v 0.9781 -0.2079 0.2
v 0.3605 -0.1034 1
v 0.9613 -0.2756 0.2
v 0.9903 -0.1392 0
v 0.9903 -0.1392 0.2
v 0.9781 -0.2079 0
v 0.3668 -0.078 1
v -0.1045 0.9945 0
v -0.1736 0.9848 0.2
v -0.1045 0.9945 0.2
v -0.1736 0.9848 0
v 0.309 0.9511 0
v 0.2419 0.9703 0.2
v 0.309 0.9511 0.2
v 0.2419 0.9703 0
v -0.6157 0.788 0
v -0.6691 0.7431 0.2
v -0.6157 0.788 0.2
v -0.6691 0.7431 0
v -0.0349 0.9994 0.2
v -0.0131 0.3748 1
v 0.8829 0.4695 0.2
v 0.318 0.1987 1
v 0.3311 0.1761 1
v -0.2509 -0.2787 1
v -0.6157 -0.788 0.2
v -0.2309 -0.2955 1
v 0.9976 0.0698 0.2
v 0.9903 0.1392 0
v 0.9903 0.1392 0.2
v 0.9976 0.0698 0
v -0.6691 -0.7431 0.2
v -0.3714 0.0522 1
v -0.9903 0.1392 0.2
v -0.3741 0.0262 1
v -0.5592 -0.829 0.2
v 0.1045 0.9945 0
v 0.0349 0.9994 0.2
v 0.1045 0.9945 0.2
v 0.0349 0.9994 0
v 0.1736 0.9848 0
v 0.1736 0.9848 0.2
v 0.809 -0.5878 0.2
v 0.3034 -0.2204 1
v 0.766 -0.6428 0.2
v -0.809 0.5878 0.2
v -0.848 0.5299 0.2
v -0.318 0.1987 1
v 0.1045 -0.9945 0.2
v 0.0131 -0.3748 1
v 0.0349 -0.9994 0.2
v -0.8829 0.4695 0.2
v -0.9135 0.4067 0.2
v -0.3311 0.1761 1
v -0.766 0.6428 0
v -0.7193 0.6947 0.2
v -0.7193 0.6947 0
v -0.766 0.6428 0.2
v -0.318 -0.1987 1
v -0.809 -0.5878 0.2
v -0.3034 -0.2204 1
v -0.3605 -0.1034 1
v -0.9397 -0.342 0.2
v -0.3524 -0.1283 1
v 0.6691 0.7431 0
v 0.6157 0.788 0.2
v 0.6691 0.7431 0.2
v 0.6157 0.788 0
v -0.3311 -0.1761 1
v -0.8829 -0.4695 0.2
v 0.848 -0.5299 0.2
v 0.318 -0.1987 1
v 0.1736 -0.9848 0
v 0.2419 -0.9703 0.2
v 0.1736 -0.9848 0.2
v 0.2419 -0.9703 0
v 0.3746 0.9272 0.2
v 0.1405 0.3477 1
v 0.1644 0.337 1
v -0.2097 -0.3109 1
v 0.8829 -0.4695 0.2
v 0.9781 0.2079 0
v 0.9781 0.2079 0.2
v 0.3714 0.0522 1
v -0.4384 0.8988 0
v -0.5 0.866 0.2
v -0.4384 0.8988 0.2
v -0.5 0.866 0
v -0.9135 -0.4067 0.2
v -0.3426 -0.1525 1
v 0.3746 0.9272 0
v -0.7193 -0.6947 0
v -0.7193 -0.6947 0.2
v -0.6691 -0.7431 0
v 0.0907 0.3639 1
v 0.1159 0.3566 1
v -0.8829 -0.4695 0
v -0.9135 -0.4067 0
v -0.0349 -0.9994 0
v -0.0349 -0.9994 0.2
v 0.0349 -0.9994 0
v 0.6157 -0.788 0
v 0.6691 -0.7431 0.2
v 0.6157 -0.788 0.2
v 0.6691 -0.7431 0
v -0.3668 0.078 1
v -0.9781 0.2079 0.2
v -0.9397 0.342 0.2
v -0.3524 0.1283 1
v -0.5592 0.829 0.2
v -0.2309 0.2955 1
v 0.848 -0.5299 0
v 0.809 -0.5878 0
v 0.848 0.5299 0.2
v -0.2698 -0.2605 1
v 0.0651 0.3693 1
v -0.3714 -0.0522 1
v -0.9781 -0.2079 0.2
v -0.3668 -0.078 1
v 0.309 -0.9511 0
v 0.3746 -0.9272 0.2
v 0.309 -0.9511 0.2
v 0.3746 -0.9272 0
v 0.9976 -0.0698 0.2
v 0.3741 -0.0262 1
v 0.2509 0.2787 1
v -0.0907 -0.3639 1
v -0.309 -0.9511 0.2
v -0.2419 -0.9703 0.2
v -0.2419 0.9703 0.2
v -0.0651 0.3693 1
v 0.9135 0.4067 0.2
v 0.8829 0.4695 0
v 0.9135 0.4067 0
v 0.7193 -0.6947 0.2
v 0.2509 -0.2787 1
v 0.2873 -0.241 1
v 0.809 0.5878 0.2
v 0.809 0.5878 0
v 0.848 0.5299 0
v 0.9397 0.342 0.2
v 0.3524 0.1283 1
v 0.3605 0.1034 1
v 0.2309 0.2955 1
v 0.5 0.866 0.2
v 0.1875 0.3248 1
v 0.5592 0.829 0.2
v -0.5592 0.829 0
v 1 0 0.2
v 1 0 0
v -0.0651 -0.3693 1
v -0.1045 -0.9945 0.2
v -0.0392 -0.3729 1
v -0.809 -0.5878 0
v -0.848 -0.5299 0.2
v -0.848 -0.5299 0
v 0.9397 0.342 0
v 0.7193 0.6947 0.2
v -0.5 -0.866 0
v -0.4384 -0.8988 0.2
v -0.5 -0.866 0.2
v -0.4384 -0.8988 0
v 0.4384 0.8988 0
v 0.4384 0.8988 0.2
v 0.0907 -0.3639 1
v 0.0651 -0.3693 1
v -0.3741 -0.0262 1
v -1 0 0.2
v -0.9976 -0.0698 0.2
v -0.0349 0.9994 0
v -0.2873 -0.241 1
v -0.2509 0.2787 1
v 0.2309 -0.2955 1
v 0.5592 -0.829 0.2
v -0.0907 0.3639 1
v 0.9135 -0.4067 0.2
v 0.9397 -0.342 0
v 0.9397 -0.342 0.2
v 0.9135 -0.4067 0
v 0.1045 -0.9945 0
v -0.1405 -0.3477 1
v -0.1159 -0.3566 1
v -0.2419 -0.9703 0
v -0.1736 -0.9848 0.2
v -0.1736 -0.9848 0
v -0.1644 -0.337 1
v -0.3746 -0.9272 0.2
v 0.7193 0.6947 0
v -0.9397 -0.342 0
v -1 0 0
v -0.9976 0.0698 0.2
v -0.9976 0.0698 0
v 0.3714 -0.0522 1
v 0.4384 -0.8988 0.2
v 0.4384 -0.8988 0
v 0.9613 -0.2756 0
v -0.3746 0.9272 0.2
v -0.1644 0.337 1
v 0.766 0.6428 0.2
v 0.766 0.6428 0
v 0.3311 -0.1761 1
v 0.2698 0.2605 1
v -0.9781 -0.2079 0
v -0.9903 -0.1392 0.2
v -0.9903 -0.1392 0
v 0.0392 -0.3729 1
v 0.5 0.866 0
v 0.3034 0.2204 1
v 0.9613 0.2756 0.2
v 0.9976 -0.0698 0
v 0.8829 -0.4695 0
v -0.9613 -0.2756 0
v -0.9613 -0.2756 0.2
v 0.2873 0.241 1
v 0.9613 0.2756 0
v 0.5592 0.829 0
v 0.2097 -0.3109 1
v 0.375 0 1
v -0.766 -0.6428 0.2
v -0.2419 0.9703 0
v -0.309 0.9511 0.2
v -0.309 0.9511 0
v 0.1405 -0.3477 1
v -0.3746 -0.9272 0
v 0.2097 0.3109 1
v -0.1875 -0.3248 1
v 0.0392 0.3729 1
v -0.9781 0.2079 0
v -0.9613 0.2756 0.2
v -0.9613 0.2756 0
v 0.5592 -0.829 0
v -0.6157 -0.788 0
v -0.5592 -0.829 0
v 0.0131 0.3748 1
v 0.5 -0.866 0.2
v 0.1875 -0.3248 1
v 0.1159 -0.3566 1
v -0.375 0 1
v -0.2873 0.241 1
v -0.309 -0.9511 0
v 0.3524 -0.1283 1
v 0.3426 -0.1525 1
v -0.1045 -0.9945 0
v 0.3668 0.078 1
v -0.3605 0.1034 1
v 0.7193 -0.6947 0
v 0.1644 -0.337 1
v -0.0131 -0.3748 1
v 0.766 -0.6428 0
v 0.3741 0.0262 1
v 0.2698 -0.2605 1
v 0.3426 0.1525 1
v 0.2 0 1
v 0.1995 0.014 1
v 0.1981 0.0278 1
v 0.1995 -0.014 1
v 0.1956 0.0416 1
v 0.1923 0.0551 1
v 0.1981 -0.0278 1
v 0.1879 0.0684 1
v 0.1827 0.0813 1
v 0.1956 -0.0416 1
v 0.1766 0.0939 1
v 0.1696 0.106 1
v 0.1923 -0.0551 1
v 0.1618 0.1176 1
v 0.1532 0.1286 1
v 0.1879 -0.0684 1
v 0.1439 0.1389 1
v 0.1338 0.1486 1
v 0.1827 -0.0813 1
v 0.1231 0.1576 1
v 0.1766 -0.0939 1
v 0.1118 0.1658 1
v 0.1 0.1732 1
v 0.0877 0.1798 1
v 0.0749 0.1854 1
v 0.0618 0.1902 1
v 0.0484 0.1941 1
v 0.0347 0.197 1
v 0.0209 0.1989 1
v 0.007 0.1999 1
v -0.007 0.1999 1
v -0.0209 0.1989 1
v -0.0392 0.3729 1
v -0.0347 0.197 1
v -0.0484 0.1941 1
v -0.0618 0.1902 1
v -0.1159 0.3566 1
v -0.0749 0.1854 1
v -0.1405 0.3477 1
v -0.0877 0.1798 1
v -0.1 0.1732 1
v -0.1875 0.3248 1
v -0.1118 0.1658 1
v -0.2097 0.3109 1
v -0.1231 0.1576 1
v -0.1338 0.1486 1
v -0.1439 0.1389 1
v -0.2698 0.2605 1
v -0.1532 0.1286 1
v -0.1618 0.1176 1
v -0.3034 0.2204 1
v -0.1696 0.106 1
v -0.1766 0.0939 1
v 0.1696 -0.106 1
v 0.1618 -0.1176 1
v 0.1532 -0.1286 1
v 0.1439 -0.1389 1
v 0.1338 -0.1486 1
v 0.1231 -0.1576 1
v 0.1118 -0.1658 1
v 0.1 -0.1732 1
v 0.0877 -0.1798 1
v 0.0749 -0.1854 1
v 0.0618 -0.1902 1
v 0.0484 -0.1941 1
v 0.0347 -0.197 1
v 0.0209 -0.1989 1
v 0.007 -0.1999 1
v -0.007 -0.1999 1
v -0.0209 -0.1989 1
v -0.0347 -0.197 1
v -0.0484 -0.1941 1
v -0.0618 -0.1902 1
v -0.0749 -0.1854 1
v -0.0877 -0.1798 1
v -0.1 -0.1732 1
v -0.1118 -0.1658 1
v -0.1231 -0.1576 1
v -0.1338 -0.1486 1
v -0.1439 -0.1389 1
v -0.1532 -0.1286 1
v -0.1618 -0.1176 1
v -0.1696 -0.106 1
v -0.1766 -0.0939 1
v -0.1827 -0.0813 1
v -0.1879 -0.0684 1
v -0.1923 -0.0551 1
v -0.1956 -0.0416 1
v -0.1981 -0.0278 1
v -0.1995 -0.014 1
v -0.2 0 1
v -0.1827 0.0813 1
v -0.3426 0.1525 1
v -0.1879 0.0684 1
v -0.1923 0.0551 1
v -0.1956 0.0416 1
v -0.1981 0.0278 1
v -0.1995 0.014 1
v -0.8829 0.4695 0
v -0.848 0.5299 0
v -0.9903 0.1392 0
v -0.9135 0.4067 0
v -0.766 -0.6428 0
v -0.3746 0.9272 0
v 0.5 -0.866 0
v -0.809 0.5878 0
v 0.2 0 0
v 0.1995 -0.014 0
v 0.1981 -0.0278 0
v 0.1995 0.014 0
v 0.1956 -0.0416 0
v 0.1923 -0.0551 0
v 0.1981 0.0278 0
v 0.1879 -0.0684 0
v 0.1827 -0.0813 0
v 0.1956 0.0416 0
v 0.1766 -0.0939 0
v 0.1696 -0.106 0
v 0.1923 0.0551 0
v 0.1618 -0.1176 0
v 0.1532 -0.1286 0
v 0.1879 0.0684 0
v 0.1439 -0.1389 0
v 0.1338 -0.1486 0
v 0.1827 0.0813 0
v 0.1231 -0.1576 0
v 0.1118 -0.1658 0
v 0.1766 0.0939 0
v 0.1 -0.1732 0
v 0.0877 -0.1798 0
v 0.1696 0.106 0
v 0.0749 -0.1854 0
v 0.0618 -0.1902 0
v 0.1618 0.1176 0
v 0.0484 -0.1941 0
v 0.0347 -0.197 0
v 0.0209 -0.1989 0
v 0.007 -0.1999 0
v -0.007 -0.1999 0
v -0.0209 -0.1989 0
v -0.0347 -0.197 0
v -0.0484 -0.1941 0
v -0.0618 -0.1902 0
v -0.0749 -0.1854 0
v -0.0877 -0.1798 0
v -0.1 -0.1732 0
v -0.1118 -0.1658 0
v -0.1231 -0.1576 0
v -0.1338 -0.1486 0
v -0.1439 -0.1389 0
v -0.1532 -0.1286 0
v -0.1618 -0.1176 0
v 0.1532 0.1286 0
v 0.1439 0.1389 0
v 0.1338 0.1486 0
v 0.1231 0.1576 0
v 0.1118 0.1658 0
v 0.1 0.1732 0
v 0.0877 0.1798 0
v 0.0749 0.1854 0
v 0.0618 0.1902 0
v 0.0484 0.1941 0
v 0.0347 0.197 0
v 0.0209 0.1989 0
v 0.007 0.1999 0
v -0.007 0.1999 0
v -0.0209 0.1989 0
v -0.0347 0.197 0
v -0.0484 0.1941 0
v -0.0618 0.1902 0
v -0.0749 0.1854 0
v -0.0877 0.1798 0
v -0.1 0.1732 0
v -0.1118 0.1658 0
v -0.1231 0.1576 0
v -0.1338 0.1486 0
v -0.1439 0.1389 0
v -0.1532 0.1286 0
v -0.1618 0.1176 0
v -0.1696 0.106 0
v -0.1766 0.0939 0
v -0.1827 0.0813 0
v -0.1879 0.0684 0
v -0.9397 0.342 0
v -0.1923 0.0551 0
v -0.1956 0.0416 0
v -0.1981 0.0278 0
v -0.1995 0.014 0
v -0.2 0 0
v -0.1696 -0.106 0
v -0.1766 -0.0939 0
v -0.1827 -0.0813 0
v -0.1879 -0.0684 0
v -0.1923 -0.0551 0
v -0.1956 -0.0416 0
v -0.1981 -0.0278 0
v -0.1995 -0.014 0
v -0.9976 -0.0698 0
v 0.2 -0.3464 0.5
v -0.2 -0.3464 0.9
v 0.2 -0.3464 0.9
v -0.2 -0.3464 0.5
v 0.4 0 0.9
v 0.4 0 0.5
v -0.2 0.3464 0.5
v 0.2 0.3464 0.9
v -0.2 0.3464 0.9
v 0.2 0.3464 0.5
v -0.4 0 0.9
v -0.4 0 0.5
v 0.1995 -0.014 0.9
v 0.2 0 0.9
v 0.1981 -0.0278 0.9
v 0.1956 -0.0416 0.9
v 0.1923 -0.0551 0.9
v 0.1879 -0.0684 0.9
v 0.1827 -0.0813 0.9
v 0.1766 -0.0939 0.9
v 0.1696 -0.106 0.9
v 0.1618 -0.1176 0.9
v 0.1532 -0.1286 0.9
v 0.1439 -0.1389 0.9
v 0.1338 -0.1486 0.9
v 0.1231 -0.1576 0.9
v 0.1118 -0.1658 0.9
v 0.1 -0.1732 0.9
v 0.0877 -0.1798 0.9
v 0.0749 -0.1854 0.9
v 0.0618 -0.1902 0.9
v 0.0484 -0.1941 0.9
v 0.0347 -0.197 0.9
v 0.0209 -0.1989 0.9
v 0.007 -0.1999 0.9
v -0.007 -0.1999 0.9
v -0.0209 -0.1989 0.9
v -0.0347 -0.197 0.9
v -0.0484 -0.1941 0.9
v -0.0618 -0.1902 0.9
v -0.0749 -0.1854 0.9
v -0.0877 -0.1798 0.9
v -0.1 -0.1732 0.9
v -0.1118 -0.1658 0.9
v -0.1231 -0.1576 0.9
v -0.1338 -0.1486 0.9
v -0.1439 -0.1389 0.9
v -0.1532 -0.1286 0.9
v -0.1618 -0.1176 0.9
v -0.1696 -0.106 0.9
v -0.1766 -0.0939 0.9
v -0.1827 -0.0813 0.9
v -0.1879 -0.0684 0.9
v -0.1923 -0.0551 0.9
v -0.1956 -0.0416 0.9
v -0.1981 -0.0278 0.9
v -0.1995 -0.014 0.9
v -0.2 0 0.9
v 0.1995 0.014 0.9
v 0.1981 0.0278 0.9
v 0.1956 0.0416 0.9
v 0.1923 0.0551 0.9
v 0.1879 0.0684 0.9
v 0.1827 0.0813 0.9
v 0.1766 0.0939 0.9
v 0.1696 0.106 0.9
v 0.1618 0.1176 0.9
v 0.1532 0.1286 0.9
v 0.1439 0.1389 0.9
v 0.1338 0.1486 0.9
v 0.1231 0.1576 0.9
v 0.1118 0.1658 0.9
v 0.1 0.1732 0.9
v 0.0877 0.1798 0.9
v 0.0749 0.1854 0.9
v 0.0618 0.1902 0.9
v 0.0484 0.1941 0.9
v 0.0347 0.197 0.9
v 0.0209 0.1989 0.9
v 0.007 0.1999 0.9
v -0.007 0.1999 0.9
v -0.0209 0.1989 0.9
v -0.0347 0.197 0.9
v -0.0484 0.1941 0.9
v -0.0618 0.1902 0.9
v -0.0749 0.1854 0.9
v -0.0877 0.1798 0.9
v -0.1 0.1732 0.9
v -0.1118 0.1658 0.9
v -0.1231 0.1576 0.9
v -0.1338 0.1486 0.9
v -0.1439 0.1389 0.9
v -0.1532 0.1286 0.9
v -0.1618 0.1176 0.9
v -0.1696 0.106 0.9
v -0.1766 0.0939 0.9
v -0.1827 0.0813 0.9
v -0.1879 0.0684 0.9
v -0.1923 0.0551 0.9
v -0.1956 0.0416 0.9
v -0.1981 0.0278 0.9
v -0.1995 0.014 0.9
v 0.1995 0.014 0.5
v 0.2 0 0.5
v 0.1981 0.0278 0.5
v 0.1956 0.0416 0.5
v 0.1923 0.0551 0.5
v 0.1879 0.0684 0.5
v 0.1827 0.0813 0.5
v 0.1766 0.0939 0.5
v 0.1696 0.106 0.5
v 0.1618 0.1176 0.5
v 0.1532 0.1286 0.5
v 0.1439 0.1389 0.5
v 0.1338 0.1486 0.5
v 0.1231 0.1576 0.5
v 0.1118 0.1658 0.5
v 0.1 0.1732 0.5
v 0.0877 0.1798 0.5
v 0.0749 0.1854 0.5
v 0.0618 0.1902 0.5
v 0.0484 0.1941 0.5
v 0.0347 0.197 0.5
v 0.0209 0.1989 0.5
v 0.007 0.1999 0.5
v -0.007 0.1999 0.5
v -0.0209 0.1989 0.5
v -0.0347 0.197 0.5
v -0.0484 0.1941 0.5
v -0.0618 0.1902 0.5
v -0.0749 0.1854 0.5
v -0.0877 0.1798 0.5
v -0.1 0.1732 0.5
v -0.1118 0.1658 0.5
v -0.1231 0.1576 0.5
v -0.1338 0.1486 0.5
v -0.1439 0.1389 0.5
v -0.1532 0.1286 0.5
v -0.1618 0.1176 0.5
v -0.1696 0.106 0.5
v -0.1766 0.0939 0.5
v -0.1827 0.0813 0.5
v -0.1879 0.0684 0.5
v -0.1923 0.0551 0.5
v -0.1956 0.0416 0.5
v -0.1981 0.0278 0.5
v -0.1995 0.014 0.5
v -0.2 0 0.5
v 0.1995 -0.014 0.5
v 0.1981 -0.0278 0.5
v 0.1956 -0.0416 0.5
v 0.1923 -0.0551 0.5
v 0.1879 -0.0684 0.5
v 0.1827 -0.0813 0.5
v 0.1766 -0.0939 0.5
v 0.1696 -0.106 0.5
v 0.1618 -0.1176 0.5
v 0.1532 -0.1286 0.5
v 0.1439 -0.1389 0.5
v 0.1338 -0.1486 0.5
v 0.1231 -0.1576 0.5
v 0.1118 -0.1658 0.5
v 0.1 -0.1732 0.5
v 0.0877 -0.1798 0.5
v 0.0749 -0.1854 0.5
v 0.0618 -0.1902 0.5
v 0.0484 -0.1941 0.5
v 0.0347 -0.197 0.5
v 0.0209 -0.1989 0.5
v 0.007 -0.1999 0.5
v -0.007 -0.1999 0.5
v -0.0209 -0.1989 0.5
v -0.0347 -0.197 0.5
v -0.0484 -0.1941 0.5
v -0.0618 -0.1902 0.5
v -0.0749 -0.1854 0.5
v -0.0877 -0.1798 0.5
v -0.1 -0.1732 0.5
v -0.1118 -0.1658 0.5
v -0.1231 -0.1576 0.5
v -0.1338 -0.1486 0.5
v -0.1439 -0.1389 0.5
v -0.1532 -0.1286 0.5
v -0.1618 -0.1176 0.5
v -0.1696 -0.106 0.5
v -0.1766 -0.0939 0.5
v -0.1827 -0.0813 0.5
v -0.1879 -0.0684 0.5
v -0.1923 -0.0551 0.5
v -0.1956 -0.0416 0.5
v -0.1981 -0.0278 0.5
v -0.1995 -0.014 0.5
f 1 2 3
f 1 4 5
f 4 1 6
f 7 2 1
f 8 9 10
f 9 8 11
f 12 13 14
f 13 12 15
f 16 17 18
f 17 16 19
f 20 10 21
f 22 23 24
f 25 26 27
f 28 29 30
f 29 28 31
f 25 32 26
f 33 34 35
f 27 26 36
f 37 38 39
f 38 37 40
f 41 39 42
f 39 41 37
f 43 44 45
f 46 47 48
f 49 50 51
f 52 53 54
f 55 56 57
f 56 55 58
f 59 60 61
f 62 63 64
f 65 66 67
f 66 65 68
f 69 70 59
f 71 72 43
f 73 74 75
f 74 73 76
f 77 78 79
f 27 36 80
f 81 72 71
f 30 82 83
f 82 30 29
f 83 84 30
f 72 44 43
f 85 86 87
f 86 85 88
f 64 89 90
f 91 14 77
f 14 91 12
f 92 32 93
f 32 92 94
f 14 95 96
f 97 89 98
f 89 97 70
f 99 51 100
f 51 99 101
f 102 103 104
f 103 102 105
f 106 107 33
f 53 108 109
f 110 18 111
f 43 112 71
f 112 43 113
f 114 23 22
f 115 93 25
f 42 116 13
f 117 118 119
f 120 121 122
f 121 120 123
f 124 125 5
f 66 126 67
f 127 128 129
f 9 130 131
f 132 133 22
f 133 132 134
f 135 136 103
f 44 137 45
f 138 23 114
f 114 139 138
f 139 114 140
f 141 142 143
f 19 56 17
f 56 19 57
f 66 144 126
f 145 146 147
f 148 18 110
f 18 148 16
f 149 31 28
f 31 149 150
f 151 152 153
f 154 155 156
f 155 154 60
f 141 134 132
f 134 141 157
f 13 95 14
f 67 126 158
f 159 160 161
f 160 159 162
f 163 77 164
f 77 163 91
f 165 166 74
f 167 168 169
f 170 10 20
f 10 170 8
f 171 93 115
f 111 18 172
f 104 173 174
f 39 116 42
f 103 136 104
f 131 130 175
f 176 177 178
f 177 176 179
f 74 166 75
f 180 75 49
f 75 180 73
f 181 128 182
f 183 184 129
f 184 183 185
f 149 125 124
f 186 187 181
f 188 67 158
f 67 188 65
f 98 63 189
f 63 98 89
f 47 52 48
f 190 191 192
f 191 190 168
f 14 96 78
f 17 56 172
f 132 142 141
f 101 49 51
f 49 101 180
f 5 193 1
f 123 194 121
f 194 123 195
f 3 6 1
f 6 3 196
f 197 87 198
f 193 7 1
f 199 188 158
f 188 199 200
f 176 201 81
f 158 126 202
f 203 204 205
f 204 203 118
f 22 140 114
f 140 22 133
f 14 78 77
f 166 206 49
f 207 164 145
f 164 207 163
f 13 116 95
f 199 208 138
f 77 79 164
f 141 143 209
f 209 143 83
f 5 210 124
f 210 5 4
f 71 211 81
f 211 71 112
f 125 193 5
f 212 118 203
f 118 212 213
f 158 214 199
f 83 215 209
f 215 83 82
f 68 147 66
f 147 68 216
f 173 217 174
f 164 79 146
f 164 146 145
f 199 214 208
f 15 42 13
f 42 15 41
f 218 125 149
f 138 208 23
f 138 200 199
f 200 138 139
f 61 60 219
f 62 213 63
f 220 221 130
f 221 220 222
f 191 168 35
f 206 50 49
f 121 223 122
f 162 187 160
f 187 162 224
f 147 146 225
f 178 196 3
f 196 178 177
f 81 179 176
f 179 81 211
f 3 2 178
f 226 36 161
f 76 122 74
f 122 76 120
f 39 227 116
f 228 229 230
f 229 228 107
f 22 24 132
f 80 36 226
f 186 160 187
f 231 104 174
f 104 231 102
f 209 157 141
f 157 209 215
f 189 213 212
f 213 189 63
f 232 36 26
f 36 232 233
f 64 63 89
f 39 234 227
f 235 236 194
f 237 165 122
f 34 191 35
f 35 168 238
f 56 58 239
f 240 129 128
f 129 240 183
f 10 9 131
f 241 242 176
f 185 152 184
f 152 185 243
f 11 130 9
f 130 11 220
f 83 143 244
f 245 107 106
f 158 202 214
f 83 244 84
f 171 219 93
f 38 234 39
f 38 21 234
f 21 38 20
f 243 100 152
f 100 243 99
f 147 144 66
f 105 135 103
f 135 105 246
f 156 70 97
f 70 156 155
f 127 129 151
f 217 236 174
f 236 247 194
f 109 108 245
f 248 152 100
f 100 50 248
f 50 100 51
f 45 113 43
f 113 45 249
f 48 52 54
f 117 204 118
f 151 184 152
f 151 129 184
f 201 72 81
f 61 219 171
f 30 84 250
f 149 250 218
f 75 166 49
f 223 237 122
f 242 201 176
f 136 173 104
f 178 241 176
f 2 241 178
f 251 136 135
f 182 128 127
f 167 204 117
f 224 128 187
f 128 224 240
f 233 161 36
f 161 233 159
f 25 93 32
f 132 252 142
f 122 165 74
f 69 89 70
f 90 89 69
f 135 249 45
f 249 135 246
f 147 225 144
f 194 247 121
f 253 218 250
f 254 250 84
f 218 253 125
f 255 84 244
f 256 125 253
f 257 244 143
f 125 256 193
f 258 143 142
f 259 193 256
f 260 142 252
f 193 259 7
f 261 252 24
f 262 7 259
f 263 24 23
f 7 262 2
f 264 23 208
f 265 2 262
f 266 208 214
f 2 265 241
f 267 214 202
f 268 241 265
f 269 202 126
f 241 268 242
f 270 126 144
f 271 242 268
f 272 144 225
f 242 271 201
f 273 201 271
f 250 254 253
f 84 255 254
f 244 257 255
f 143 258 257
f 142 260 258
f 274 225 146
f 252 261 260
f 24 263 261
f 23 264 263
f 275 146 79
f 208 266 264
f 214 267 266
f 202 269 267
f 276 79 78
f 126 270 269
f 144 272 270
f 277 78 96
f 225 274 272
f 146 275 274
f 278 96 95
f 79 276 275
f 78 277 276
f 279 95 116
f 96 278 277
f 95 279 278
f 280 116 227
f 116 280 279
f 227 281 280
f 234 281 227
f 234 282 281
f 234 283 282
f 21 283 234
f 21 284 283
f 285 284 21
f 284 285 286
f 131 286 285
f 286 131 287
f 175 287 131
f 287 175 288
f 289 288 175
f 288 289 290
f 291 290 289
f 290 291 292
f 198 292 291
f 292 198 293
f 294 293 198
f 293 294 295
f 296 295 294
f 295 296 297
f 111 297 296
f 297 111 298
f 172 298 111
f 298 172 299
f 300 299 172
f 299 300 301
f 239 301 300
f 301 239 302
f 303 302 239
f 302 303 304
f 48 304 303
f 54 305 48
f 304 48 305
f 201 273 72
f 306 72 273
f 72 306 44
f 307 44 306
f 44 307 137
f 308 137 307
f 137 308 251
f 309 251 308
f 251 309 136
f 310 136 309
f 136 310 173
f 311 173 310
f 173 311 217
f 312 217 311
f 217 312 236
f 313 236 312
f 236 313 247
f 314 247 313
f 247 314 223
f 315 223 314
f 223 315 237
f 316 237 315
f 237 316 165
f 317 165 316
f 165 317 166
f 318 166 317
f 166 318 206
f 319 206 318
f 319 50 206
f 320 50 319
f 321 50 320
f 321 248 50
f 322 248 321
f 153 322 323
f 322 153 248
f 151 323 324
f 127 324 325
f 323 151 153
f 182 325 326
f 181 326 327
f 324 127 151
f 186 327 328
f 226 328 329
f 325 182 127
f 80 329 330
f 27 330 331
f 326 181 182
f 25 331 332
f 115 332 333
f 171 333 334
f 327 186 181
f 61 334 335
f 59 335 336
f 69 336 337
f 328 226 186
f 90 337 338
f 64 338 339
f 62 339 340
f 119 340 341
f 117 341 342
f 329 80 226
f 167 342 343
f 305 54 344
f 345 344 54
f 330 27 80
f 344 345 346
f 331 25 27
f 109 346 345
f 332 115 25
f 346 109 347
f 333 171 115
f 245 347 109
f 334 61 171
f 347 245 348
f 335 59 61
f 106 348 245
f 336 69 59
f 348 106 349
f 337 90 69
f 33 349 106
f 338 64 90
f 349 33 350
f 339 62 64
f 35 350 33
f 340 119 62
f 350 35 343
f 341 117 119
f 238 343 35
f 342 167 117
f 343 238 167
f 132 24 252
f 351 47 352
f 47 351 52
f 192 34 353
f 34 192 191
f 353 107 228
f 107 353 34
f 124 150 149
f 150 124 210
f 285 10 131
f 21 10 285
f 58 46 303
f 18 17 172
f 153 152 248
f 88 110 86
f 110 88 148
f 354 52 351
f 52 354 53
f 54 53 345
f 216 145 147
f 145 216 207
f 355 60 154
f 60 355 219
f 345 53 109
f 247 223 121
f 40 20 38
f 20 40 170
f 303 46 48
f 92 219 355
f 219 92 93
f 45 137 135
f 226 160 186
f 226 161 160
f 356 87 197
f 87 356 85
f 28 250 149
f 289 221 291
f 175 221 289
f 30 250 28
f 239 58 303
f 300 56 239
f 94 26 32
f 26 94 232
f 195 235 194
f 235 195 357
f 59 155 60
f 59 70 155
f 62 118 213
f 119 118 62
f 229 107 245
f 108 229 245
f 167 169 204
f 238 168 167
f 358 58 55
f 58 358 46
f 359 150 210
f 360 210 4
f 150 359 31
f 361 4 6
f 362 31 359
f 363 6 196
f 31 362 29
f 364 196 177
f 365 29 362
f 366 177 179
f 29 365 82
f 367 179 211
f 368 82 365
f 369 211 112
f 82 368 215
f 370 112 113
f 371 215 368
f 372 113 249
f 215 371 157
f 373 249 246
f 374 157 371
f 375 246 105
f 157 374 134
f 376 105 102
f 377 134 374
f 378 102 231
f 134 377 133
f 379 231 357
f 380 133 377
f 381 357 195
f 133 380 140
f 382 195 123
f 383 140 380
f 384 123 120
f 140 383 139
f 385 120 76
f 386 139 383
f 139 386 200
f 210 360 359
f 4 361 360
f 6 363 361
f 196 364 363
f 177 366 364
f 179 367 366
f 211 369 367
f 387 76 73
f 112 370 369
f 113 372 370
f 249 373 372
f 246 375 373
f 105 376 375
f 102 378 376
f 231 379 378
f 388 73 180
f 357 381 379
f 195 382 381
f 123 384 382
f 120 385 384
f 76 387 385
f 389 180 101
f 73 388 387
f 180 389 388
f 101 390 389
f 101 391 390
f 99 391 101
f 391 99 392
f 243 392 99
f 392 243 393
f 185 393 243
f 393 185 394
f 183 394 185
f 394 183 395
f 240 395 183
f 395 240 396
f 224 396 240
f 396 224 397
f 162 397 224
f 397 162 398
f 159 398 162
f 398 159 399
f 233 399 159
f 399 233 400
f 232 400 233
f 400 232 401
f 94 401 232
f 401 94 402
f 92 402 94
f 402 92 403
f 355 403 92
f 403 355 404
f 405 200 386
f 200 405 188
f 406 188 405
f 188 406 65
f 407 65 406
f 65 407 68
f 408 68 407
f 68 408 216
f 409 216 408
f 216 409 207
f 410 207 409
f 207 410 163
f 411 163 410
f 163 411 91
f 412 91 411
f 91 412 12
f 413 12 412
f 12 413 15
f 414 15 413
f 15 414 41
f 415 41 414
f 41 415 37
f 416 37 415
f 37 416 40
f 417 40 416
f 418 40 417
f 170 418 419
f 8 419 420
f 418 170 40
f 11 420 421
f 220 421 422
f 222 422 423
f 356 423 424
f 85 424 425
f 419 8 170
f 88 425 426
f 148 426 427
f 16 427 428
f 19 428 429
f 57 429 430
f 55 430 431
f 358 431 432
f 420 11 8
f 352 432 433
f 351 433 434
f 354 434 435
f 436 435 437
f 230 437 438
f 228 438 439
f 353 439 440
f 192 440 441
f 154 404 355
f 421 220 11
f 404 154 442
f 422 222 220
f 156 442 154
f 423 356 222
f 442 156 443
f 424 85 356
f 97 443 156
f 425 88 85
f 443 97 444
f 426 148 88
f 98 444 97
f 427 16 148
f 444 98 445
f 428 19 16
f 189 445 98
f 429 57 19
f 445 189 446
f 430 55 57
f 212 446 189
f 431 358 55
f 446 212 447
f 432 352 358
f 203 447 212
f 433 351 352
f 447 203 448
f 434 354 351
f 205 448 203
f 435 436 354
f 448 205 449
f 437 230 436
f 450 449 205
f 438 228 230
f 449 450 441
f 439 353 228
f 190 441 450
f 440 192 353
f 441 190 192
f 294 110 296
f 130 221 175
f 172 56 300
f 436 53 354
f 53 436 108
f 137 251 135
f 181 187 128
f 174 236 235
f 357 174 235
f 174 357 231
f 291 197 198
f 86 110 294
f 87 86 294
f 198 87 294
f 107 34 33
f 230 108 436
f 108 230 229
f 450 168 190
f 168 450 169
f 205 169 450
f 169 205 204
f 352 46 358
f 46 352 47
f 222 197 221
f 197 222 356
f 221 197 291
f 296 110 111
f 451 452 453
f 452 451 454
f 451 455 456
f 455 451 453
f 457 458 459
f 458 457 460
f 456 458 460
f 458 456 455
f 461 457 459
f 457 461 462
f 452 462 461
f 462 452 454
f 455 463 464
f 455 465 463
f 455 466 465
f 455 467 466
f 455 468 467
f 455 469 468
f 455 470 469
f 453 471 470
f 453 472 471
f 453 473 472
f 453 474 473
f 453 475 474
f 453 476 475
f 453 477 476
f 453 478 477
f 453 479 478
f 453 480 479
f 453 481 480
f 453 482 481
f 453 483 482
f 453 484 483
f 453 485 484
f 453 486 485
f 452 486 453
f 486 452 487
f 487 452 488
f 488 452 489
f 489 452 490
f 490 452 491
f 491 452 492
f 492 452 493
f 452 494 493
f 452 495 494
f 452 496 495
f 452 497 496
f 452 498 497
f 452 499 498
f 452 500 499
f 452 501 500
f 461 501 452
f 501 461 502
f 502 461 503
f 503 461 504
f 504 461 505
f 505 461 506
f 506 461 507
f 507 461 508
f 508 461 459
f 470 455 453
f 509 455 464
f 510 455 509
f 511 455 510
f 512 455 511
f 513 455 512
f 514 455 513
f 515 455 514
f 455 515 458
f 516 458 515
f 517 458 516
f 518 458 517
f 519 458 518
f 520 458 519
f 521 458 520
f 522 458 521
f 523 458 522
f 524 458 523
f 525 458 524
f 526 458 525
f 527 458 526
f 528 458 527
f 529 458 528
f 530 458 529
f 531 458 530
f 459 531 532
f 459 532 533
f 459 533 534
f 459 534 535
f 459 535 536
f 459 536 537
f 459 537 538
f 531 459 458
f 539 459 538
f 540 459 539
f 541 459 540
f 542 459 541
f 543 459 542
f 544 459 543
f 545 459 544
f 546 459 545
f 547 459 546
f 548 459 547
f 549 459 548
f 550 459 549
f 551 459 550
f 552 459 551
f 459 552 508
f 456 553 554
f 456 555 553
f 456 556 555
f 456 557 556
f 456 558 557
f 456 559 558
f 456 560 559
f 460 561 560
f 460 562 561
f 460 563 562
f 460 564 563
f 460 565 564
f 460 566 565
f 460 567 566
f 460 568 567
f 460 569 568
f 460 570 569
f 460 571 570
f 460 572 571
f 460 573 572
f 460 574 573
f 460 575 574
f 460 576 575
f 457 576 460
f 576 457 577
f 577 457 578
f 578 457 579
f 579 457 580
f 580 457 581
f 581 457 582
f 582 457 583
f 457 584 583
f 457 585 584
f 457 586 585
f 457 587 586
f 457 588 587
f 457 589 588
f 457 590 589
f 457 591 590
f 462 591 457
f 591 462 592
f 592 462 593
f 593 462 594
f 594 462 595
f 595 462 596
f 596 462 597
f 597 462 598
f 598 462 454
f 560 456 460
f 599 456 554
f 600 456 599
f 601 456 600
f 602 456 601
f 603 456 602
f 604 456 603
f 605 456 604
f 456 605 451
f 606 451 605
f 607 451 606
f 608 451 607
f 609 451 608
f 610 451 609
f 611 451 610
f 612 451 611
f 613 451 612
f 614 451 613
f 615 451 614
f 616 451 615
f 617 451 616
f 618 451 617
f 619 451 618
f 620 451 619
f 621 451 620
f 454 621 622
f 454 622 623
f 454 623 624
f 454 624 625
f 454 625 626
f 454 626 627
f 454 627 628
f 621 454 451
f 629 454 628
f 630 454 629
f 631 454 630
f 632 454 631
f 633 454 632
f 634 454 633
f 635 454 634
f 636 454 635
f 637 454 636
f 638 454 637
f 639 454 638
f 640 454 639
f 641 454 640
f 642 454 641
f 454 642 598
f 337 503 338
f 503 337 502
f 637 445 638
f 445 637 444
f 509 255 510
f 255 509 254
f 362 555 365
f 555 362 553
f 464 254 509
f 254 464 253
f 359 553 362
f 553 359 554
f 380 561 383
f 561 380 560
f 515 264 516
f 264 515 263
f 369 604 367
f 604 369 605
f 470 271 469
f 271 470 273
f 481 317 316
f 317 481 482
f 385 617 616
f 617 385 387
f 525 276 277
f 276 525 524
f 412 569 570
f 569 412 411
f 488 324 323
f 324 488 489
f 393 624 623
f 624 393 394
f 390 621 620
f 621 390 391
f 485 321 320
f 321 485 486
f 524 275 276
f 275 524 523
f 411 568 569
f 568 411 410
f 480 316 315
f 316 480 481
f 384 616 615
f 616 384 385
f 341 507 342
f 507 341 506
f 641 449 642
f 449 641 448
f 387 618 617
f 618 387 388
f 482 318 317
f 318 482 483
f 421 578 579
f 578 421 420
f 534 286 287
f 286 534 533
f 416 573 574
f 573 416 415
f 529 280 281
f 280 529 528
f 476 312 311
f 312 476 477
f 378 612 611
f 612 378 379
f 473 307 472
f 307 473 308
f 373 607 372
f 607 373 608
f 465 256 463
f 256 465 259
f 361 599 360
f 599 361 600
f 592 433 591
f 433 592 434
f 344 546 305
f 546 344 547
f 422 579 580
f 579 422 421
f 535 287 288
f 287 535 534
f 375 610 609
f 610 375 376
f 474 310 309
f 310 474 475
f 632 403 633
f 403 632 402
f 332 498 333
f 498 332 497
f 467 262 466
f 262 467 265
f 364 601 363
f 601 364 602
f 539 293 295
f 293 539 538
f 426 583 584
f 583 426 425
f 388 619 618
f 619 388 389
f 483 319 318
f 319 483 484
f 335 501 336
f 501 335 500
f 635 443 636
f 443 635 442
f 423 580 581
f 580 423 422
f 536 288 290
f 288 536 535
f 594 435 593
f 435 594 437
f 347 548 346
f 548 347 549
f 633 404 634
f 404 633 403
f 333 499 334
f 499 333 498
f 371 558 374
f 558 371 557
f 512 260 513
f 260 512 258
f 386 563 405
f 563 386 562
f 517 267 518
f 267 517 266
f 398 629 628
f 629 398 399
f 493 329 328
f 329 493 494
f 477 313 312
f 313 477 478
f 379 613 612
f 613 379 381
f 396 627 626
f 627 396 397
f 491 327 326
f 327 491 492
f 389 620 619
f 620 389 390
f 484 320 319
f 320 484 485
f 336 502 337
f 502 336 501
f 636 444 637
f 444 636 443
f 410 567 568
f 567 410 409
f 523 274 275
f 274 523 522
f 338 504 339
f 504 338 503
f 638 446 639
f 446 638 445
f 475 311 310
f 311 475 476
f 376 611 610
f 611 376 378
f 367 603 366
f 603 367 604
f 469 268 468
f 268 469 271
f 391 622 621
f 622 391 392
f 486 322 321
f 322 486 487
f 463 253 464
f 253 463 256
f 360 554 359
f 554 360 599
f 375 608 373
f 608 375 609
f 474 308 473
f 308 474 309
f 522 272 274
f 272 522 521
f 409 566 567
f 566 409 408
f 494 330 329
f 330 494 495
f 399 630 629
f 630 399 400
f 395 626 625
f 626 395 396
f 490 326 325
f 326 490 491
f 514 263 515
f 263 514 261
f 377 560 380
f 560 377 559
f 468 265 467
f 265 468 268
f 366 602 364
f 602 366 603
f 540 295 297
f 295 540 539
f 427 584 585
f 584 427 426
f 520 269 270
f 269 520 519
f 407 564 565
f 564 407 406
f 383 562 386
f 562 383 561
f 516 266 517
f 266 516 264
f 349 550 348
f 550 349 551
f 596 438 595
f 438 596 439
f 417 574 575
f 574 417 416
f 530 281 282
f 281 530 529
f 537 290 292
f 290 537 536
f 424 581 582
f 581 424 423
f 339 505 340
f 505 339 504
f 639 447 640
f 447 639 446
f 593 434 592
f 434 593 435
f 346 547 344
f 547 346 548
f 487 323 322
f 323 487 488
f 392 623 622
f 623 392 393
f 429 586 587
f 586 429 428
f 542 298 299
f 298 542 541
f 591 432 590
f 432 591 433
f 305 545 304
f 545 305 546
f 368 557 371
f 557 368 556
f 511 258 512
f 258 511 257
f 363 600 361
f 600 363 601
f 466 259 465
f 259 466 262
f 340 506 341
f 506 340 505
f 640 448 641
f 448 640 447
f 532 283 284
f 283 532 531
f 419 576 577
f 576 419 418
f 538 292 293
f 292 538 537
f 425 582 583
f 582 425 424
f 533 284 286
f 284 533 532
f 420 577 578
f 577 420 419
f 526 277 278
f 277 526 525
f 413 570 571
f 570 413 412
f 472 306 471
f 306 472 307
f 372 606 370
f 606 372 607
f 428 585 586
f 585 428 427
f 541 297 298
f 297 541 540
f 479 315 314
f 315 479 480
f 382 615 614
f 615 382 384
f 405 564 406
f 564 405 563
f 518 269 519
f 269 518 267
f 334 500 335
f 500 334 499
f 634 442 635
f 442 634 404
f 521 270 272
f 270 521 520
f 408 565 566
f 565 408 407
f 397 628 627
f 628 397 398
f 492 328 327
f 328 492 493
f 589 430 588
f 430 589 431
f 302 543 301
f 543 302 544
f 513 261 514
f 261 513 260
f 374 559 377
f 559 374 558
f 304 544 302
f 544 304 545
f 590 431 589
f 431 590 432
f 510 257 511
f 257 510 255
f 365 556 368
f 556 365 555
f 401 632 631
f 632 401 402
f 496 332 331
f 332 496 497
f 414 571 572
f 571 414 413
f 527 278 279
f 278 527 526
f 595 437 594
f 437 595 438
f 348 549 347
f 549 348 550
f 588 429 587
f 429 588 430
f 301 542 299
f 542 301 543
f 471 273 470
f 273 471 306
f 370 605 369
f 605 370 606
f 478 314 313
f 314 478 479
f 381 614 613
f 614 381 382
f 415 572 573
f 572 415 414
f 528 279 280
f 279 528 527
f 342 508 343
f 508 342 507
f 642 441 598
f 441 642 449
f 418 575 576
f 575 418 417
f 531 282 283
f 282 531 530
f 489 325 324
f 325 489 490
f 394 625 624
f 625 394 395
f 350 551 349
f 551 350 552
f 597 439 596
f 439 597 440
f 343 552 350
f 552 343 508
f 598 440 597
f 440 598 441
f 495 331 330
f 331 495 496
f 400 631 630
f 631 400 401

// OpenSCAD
$fn=90;
extra=0.2;
bottom=1;
top=(3/4)*bottom;
nut=0.6;
nut_h=0.2;
nut_num_l=6;
bolt=0.4;
distance=1;
layer=0; //=0:print; =-1:show at stop layer >0 cut at value layer 
layer_heigth=0.3;

difference(){
    difference(){
        hull(){
            cylinder(d=top,h=distance);
            cylinder(d=2*bottom,h=0.2*distance);
        }
        translate([0,0,(1/2)*distance])cylinder(d=nut+extra,h=nut_h+extra,$fn=nut_num_l);
        cylinder(d=bolt,h=distance);

    }   
    if (layer==0){
        stop_layer=(1/2)*distance+nut_h+extra;
        echo(stop_layer);
    }
    else if (layer<0){
        stop_layer=(1/2)*distance+nut_h+extra;
        translate([0,0,stop_layer])cylinder(d=2*bottom,h=distance);
        echo(stop_layer);
    }
    else if (layer>0){
        translate([0,0,layer])cylinder(d=2*bottom,h=distance);}
    
}
